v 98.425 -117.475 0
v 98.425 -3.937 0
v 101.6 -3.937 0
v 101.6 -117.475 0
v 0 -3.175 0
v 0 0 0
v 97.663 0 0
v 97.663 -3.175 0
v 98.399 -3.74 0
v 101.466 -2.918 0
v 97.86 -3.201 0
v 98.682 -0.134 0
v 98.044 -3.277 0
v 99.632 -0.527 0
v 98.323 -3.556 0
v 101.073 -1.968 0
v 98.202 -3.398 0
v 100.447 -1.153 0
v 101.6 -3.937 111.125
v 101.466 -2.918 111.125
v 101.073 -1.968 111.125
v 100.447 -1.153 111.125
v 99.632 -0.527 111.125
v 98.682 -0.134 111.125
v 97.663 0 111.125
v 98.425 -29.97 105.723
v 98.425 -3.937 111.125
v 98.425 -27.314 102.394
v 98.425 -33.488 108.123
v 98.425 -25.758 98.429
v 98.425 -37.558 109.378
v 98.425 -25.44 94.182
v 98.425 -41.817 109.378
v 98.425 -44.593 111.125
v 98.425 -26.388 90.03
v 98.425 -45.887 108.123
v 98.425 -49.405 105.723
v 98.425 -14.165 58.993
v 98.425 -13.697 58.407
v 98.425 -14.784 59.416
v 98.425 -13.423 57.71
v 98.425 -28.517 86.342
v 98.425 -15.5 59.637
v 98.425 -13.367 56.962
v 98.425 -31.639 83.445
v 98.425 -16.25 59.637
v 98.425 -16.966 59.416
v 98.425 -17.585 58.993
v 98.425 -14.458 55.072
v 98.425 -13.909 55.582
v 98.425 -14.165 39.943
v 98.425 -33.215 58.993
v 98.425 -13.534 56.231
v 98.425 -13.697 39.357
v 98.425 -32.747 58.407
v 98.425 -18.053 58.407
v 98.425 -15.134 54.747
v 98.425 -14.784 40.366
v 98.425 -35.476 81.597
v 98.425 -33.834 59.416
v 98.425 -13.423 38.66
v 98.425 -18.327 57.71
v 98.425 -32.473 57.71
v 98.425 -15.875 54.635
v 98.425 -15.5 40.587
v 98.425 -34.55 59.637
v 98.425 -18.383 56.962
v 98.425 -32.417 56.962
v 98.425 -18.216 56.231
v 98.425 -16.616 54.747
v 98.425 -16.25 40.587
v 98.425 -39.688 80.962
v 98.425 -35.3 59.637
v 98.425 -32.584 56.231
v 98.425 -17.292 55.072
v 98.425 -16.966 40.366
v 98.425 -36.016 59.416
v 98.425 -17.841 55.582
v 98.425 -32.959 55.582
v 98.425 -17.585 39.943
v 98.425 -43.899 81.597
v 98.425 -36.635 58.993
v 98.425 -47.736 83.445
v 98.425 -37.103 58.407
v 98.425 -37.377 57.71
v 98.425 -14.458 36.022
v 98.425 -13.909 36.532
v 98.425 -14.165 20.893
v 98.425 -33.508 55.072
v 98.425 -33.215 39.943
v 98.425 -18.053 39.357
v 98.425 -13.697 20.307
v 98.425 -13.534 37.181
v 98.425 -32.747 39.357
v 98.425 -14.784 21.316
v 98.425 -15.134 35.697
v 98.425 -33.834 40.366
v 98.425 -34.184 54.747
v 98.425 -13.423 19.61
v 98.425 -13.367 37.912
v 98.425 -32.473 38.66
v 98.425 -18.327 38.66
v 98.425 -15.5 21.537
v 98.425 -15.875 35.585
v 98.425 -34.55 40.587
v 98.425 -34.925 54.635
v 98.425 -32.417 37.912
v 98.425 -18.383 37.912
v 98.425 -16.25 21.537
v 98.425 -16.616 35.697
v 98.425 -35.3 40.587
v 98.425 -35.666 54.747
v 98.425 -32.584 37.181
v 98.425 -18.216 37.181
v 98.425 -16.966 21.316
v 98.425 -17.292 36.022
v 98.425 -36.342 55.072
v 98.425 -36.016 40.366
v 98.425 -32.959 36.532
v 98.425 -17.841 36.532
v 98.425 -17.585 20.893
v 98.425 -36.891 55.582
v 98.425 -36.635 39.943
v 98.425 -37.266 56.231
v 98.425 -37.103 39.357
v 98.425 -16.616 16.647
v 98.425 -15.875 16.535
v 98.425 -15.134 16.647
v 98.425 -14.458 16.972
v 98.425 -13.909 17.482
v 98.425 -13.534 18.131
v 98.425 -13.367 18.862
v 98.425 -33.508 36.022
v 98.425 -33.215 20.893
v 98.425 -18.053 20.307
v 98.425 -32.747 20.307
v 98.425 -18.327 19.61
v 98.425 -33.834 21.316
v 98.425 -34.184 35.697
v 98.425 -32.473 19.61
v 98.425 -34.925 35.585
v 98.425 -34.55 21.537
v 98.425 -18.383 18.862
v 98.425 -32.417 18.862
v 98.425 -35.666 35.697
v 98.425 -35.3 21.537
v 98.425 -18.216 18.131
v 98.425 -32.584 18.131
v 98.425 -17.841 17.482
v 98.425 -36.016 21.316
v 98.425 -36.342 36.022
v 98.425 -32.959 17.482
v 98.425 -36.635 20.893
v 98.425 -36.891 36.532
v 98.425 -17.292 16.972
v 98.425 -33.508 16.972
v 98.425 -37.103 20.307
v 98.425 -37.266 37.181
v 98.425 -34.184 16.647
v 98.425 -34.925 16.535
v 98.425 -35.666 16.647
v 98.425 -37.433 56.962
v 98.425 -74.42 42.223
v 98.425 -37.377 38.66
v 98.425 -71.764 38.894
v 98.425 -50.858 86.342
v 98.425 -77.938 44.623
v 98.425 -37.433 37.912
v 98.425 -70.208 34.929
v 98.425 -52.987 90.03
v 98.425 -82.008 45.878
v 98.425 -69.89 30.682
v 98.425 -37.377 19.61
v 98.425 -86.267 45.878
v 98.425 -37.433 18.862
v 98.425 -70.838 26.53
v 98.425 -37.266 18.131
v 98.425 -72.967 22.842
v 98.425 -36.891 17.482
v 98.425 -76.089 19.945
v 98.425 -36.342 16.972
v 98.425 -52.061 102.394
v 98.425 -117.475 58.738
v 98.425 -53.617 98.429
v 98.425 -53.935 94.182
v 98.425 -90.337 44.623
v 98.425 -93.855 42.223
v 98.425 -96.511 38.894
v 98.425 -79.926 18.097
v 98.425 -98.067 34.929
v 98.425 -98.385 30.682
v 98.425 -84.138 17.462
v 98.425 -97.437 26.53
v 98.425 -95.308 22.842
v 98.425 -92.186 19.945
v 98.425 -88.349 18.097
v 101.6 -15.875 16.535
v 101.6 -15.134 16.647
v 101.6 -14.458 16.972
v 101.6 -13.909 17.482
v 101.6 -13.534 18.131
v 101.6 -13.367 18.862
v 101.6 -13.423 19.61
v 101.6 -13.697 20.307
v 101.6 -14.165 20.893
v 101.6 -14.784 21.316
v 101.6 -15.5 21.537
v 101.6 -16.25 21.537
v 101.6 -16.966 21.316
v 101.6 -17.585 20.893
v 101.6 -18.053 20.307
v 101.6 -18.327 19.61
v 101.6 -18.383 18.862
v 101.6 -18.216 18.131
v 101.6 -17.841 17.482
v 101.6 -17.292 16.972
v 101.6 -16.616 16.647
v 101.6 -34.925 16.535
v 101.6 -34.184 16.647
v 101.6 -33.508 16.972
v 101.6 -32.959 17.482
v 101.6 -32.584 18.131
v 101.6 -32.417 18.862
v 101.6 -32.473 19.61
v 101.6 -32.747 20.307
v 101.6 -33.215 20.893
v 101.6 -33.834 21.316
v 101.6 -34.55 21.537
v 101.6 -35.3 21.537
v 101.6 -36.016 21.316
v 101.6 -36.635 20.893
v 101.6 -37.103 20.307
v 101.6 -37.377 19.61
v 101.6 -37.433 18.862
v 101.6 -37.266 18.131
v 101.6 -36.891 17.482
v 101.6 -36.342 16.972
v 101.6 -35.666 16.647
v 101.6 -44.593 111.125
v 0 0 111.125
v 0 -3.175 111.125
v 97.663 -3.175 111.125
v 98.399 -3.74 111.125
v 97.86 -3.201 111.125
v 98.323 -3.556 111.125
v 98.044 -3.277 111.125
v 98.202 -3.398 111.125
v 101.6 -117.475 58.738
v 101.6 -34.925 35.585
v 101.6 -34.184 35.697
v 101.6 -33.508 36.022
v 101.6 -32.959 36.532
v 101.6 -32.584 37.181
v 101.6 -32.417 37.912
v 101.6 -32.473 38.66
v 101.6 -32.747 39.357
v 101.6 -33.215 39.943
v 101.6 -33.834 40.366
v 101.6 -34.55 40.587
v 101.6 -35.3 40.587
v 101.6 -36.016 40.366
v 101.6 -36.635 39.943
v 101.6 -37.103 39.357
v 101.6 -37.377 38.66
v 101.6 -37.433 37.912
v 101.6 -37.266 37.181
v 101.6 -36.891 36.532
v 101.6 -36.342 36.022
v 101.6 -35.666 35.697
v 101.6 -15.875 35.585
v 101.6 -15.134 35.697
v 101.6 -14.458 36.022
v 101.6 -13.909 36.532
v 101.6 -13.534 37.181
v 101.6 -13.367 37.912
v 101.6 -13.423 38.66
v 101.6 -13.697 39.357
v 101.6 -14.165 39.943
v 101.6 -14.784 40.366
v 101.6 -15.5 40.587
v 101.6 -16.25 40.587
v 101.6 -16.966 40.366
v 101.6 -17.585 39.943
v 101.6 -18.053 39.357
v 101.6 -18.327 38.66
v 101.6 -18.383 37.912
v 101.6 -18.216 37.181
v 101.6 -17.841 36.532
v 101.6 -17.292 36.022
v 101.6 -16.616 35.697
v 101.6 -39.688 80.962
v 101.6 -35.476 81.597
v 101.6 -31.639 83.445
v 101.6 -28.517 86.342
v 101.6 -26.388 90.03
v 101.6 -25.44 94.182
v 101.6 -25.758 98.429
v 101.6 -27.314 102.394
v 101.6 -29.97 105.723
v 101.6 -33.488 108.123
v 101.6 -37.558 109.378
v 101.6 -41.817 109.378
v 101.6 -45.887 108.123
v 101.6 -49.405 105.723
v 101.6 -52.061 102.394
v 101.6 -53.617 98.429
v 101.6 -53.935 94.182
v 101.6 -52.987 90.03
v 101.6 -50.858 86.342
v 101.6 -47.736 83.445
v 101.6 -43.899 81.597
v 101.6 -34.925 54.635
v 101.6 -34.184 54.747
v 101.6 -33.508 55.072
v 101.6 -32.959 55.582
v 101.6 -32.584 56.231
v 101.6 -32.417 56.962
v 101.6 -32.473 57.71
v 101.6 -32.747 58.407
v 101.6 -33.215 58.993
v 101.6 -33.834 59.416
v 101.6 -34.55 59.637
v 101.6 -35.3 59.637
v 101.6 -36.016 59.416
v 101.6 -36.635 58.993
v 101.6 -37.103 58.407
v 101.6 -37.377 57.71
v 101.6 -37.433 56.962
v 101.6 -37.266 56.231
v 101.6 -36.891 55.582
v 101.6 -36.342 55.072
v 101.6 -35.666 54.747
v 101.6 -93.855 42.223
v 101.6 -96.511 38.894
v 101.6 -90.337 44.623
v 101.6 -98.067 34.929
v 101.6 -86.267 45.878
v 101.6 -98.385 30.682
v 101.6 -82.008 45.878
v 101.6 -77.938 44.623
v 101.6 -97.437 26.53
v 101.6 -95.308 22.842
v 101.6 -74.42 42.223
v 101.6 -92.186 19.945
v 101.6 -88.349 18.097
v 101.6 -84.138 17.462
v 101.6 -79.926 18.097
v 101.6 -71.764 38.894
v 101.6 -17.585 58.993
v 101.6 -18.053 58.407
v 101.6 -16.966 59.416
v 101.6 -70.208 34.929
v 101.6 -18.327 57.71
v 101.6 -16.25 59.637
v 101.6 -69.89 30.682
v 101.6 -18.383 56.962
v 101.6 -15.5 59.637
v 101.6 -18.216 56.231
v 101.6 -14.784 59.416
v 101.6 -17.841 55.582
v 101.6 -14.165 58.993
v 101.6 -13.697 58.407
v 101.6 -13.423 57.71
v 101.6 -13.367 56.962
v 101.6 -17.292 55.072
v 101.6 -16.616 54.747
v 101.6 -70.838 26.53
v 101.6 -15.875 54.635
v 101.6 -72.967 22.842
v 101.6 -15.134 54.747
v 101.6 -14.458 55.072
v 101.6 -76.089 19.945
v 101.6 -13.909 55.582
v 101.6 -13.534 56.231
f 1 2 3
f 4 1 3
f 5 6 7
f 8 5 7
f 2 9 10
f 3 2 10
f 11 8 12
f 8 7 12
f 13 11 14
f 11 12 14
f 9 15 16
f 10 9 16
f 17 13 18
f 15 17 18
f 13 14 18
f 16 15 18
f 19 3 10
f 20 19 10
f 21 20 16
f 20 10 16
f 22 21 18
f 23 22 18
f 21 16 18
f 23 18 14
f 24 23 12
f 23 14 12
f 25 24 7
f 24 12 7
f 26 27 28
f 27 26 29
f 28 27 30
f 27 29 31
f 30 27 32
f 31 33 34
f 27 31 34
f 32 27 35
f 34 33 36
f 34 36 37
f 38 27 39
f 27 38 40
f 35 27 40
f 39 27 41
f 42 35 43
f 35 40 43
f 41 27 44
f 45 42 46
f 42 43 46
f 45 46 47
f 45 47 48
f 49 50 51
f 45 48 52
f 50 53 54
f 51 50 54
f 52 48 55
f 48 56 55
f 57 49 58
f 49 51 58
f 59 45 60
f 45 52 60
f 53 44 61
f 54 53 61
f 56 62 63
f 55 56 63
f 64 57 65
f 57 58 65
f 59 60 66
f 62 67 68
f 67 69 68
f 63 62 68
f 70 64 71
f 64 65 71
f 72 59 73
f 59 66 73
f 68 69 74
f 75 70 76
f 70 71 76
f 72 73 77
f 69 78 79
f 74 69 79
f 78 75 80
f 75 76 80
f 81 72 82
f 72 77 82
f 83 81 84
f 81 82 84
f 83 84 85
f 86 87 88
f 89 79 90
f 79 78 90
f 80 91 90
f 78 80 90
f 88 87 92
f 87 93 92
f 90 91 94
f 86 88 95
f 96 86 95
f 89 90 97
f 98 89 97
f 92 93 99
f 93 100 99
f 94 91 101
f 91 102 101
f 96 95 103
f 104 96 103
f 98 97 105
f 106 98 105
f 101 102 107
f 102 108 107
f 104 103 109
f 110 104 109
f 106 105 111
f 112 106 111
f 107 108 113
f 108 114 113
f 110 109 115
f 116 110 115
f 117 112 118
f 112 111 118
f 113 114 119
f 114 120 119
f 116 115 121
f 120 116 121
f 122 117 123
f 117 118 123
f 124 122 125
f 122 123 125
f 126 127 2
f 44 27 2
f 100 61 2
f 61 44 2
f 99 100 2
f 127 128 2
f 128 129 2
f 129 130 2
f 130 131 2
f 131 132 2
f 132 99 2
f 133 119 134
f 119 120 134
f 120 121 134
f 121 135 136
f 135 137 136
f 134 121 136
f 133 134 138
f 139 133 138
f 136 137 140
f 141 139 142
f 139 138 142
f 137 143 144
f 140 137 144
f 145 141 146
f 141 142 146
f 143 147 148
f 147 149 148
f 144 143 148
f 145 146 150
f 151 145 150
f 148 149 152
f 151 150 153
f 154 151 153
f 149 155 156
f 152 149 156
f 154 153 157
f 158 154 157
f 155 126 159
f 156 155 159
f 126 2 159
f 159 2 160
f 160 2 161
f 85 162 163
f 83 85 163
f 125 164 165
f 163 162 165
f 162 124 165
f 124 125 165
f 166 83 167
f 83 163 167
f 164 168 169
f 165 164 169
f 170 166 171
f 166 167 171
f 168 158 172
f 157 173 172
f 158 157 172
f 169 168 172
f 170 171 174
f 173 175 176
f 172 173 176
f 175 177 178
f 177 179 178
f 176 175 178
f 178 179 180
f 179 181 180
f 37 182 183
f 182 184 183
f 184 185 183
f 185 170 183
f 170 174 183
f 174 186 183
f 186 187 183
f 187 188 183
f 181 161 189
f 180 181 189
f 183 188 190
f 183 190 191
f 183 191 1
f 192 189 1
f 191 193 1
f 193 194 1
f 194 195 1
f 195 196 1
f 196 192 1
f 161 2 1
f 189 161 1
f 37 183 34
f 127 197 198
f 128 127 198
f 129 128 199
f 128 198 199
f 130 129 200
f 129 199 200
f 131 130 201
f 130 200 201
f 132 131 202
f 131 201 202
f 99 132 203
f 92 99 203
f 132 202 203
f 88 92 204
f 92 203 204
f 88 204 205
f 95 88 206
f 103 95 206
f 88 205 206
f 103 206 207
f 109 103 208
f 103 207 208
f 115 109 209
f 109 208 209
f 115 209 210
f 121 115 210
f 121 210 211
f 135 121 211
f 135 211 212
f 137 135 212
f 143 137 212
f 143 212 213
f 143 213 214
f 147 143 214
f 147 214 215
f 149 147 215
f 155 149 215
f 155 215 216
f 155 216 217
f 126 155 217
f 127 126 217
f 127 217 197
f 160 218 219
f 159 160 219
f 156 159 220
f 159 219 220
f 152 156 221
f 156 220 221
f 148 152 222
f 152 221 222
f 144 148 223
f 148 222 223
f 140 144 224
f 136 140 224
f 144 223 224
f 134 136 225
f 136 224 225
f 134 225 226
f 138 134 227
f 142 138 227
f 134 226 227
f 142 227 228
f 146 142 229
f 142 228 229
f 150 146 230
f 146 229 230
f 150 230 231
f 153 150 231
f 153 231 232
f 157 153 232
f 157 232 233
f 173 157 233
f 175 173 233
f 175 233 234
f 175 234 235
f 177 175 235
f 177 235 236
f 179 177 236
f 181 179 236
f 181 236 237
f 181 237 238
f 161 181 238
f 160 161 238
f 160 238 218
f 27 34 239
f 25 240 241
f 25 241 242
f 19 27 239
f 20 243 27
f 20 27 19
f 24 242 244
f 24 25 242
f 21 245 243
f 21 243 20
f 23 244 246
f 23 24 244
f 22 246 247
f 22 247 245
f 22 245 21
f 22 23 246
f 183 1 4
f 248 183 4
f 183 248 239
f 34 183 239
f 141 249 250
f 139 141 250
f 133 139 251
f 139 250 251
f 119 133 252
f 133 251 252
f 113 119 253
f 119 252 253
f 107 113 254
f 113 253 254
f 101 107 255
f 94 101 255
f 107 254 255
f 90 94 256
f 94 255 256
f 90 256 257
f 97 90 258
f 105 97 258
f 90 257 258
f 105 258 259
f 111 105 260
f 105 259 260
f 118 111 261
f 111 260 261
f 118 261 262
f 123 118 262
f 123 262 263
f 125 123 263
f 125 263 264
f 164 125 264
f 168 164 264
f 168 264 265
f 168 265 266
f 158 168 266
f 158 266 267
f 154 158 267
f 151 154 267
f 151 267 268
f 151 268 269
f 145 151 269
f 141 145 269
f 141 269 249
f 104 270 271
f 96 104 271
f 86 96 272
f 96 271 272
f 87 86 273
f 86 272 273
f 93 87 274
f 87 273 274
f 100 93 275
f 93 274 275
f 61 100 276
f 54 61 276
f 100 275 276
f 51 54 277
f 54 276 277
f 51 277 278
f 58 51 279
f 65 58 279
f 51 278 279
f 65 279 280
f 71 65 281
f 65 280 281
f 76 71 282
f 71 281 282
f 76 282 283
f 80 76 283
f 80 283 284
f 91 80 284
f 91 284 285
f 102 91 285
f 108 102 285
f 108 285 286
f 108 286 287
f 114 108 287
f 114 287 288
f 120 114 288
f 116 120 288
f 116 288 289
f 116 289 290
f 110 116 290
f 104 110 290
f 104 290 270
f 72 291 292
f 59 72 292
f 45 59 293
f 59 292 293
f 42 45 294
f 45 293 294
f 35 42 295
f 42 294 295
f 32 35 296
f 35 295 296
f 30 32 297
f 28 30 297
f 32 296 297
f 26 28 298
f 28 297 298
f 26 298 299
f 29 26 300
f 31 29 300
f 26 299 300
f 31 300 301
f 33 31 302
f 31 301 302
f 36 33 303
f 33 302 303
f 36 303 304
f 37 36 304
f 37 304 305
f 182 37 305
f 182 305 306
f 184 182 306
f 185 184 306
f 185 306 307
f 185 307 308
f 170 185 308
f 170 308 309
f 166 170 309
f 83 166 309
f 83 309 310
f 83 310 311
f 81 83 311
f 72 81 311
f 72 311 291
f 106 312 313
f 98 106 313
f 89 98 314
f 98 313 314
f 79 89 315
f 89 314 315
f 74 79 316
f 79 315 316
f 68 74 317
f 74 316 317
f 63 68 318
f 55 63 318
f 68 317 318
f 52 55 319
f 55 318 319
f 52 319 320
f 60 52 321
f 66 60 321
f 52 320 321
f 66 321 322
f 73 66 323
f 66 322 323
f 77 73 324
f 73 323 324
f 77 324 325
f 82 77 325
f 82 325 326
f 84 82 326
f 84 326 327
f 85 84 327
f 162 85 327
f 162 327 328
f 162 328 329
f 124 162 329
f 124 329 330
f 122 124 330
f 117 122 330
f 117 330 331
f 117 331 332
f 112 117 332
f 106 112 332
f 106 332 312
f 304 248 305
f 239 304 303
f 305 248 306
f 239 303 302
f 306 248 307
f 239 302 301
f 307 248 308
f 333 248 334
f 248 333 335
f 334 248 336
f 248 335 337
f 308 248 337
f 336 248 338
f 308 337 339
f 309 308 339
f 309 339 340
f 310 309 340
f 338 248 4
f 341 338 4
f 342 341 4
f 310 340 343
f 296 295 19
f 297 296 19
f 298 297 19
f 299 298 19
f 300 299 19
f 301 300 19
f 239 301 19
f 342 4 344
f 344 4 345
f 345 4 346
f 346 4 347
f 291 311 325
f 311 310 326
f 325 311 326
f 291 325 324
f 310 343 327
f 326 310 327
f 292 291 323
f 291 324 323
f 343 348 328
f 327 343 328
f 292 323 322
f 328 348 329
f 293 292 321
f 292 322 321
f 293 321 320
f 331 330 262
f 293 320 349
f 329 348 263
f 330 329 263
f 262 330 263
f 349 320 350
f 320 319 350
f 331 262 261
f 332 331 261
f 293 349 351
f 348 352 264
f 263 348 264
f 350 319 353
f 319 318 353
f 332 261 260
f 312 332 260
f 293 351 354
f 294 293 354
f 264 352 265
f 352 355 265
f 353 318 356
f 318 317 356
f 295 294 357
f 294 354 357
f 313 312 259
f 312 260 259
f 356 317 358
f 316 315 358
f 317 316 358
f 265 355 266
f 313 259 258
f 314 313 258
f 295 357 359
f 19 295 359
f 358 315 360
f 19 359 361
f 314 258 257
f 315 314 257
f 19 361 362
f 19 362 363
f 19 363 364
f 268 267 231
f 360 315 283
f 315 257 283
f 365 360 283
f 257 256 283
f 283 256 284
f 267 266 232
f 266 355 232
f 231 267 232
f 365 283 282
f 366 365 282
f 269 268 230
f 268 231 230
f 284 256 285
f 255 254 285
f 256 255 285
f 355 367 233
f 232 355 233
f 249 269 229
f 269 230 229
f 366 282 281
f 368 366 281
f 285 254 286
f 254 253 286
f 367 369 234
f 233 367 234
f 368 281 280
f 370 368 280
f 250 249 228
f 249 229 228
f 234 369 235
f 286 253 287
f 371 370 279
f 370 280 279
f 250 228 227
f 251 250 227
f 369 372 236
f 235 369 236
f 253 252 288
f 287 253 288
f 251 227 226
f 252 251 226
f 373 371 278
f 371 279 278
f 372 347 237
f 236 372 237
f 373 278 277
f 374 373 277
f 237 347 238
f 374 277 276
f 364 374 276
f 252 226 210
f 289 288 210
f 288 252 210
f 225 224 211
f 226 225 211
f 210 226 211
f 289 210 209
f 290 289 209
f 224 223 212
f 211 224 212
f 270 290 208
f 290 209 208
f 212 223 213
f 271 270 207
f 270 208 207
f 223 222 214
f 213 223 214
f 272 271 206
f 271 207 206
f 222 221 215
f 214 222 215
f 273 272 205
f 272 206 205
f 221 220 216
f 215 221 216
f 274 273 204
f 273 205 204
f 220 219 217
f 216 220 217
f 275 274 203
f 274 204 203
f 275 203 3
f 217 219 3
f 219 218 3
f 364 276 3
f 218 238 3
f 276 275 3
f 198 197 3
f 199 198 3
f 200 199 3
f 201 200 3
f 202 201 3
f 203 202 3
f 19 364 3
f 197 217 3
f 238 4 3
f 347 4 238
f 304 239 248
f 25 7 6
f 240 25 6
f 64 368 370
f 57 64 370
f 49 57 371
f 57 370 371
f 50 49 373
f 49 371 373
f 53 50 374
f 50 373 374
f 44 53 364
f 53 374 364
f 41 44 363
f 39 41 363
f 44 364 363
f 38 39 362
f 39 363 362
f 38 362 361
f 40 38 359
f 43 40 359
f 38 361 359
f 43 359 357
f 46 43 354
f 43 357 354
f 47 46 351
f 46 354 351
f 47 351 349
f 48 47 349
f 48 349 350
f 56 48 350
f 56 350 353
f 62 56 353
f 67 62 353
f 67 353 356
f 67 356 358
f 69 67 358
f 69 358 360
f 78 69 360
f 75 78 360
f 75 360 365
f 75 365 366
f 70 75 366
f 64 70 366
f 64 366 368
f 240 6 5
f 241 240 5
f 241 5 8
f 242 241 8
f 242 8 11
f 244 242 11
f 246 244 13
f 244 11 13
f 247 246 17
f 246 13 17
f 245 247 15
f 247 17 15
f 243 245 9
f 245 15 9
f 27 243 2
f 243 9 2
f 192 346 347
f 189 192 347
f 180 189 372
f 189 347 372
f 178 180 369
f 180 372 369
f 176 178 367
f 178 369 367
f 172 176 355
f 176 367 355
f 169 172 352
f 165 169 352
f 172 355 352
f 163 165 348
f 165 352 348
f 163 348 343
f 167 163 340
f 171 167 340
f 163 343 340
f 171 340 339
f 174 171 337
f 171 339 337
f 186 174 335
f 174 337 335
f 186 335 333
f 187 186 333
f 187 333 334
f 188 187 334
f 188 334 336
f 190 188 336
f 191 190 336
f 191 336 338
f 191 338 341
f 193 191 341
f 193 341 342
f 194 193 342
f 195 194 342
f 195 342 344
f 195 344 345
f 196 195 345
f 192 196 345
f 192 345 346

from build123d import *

# Parameters (mm, degrees)
BASE_FLANGE1_DEPTH = 111.125
SKETCH16_R         = 14.2875
SKETCH16_R_2       = 2.5146
CUT_EXTRUDE1_DEPTH = 191.975656171


# Read off the part's stored shape, not the designer's step: Base-Flange1
with BuildPart() as part:
    # Base-Flange1 outline → Base-Flange1 (new body)
    with BuildSketch(Plane.XY):
        with BuildLine():
            Line((98.425, -3.937), (98.425, -117.475))
            Line((98.425, -117.475), (101.6, -117.475))
            Line((101.6, -117.475), (101.6, -3.937))
            ThreePointArc((101.6, -3.937), (100.446879398, -1.153120602), (97.663, 0))
            Line((97.663, 0), (0, 0))
            Line((0, 0), (0, -3.175))
            Line((0, -3.175), (97.663, -3.175))
            ThreePointArc((97.663, -3.175), (98.201815367, -3.398184633), (98.425, -3.937))
        make_face()
    extrude(amount=BASE_FLANGE1_DEPTH)

    # Sketch16 → Cut-Extrude1 (cut, through all)
    with BuildSketch(Plane(origin=(101.6, 0, 0), x_dir=(0, 0, -1), z_dir=(1, 0, 0))):
        with Locations((-31.75, -84.1375)):
            Circle(SKETCH16_R)
        with Locations((-95.25, -39.6875)):
            Circle(SKETCH16_R)
        with Locations((-38.1, -15.875)):
            Circle(SKETCH16_R_2)
        with Locations((-38.1, -34.925)):
            Circle(SKETCH16_R_2)
        with Locations((-57.15, -15.875)):
            Circle(SKETCH16_R_2)
        with Locations((-57.15, -34.925)):
            Circle(SKETCH16_R_2)
        with Locations((-19.05, -15.875)):
            Circle(SKETCH16_R_2)
        with Locations((-19.05, -34.925)):
            Circle(SKETCH16_R_2)
        Polygon((-58.7375, -117.475), (-111.125, -44.592589994), (-111.125, -117.475), align=None)
    extrude(amount=-CUT_EXTRUDE1_DEPTH, mode=Mode.SUBTRACT)


solid = part.part
